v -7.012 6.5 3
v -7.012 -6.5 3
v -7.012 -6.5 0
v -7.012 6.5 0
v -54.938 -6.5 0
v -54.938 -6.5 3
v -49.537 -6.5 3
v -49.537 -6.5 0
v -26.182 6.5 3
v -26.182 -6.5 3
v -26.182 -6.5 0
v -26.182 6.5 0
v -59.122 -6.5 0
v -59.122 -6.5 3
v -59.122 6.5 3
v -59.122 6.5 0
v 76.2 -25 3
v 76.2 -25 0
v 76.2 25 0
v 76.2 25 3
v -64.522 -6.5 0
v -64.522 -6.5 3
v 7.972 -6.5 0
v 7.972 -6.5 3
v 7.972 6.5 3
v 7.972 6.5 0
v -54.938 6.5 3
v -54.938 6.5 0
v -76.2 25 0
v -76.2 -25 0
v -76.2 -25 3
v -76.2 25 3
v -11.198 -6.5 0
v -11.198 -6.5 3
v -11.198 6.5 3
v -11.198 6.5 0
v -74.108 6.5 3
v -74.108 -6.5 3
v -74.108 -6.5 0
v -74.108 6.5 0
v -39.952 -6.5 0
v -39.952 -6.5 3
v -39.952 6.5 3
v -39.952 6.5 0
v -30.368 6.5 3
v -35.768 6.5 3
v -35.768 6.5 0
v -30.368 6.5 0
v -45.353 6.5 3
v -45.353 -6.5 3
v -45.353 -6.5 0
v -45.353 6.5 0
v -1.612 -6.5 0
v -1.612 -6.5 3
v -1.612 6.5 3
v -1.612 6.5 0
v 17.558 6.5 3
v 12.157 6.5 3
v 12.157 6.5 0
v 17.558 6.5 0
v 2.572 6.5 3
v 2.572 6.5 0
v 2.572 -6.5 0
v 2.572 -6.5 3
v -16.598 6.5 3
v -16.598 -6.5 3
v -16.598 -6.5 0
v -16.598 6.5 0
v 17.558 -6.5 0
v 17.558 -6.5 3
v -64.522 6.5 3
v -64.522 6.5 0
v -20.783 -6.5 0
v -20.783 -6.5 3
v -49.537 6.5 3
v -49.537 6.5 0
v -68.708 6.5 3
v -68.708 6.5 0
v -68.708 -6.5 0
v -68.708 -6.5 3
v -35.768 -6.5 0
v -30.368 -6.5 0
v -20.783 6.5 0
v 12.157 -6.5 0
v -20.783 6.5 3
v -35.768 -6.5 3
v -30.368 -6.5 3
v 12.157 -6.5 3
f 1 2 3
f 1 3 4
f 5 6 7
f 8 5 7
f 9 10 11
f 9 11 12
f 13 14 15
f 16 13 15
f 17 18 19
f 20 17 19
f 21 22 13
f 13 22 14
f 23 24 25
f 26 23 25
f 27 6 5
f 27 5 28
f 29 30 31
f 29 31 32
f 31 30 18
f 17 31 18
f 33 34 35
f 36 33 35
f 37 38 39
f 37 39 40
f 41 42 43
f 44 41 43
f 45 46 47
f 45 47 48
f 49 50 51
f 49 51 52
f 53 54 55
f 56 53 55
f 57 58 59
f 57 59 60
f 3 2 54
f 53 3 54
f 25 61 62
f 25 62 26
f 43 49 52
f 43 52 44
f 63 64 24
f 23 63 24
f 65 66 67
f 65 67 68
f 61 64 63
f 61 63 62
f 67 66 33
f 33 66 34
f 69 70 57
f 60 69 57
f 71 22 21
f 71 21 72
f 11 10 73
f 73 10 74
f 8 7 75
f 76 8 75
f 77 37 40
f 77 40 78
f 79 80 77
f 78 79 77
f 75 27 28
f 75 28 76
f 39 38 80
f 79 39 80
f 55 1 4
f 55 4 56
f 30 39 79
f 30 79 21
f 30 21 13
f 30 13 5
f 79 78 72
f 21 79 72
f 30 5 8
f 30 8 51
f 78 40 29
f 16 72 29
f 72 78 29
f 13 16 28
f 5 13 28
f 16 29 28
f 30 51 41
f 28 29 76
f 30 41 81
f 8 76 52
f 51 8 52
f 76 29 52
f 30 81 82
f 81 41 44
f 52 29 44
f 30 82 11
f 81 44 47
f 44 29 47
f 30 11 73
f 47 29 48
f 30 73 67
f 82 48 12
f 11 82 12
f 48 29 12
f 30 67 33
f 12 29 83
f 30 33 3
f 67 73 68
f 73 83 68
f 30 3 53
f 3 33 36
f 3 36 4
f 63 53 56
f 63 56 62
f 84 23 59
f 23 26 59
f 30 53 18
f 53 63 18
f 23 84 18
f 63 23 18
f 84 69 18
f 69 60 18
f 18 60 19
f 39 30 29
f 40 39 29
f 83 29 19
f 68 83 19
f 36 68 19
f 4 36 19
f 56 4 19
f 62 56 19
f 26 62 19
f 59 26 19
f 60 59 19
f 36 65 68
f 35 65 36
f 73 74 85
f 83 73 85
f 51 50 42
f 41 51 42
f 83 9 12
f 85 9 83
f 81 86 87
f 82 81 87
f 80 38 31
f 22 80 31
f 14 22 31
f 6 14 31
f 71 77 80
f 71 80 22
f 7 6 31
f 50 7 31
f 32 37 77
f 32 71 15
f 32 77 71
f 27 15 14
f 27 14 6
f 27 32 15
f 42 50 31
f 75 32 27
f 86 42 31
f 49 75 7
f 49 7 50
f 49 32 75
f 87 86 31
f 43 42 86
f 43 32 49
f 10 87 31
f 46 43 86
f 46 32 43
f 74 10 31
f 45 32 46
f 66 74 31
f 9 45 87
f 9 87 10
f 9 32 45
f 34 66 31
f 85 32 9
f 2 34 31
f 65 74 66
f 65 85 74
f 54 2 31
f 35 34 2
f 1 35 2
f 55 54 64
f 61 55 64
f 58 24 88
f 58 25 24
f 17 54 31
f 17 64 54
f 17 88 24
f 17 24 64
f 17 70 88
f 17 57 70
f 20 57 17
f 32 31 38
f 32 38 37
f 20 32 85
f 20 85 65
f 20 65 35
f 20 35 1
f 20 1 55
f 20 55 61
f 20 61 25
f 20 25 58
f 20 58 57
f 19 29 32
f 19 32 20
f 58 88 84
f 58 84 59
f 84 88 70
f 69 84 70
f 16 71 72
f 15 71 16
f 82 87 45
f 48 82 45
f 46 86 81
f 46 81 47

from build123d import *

# Parameters (mm, degrees)
F0_W     = 152.4
F0_H     = 50
F1_DEPTH = 3
F2_W     = 5.4
F2_H     = 13
F3_DEPTH = 3.001


with BuildPart() as f1:
    # F0 (on Top) → F1 (new body)
    with BuildSketch(Plane.XY):
        Rectangle(F0_W, F0_H)
    extrude(amount=F1_DEPTH)

    # F2 (on face) → F3 (cut, through all)
    with BuildSketch(Plane.XY.offset(3)):
        with Locations((-71.4075, 0)):
            Rectangle(F2_W, F2_H)
        with Locations((-61.8225, 0)):
            Rectangle(F2_W, F2_H)
        with Locations((-52.2375, 0)):
            Rectangle(F2_W, F2_H)
        with Locations((-42.6525, 0)):
            Rectangle(F2_W, F2_H)
        with Locations((-33.0675, 0)):
            Rectangle(F2_W, F2_H)
        with Locations((-23.4825, 0)):
            Rectangle(F2_W, F2_H)
        with Locations((-13.8975, 0)):
            Rectangle(F2_W, F2_H)
        with Locations((-4.3125, 0)):
            Rectangle(F2_W, F2_H)
        with Locations((5.2725, 0)):
            Rectangle(F2_W, F2_H)
        with Locations((14.8575, 0)):
            Rectangle(F2_W, F2_H)
    extrude(amount=-F3_DEPTH, mode=Mode.SUBTRACT)


solid = f1.part
